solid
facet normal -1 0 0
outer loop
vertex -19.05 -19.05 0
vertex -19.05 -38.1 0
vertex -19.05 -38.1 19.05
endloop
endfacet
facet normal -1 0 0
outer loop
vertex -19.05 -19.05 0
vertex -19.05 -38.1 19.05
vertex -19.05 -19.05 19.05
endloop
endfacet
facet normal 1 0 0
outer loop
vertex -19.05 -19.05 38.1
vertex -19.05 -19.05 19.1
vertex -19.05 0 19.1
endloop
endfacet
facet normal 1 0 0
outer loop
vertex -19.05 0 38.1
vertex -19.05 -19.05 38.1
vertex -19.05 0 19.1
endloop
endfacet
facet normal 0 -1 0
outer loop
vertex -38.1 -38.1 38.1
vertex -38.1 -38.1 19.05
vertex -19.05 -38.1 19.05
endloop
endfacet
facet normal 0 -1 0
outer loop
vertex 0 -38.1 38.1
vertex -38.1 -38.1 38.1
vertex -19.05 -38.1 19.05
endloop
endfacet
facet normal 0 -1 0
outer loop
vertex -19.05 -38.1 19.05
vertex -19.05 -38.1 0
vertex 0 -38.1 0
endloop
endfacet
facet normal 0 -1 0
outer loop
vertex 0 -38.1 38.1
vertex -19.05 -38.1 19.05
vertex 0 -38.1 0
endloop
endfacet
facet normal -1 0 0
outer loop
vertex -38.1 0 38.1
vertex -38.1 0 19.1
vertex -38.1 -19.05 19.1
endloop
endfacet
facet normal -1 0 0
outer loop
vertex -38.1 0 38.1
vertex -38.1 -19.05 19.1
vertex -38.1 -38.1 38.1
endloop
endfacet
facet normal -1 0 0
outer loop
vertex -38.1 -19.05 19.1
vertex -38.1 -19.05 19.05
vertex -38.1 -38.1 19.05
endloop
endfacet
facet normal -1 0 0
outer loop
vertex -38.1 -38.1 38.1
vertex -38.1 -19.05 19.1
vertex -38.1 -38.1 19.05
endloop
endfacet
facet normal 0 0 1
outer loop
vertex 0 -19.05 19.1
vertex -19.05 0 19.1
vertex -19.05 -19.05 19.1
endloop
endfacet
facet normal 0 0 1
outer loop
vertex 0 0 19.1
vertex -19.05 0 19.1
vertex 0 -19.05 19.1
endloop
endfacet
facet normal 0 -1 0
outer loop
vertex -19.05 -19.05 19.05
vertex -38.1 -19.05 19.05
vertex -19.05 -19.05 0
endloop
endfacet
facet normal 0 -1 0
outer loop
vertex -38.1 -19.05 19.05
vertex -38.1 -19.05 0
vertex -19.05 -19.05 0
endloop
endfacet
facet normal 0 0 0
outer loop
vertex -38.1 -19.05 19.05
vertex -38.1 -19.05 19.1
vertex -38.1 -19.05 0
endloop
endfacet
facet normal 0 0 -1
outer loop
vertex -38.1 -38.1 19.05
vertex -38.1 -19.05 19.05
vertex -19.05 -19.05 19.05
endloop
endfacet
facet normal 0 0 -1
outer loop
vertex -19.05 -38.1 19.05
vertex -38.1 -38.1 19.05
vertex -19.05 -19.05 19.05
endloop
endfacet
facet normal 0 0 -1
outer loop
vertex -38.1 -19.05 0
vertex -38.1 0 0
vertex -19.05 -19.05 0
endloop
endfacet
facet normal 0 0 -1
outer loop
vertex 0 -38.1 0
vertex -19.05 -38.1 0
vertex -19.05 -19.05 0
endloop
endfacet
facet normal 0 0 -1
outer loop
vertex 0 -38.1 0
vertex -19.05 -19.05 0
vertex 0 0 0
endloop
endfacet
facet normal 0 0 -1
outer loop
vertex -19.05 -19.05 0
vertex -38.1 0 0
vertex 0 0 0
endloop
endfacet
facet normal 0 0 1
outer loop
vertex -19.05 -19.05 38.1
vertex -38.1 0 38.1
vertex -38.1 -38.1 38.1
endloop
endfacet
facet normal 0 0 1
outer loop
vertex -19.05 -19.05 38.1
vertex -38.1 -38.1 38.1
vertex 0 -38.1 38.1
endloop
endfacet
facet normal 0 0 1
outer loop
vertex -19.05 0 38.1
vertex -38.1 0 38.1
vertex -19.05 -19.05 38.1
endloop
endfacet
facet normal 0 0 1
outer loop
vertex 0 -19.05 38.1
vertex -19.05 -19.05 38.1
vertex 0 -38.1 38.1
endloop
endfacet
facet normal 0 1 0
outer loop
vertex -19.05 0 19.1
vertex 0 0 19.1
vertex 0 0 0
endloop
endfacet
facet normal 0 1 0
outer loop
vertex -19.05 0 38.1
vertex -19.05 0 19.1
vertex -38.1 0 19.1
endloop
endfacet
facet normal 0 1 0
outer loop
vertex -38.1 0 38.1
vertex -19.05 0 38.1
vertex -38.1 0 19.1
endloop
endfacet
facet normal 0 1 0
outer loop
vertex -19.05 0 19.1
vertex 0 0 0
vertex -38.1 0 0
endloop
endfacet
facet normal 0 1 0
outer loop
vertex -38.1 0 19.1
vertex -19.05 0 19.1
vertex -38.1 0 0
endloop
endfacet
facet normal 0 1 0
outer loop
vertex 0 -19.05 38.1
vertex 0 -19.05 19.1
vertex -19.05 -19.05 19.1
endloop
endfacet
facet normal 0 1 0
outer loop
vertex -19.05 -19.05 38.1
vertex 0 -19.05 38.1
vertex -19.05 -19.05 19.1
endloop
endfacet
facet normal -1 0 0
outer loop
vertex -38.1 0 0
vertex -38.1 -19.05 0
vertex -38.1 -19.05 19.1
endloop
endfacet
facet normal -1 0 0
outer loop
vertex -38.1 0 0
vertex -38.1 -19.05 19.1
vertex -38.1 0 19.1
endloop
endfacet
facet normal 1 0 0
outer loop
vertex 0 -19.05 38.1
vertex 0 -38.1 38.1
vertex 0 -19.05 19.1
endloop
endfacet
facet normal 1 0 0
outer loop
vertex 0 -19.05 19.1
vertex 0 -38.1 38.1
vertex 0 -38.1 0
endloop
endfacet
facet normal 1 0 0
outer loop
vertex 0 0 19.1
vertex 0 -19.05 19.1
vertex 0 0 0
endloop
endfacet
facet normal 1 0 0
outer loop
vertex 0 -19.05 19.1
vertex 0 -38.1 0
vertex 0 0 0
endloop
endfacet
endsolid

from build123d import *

# Parameters (mm, degrees)
F0_W     = 19.0500004709
F0_H     = 19.05
F0_W_2   = 19.0500002354
F0_W_3   = 19.05
F1_DEPTH = 19.1
F4_DEPTH = 19.05


with BuildPart() as f1:
    # F0 (on Top) → F1 (new body)
    with BuildSketch(Plane.XY):
        with Locations((-28.5750002354, -9.525)):
            Rectangle(F0_W, F0_H)
        with Locations((-9.5250001177, -9.525)):
            Rectangle(F0_W_2, F0_H)
        with Locations((-9.525, -28.575)):
            Rectangle(F0_W_3, F0_H)
    extrude(amount=F1_DEPTH)

    # F3 (on offset) → F4 (join)
    with BuildSketch(Plane.XY.offset(19.05)):
        Polygon((-19.05, 0), (-38.1, 0), (-38.1, -38.1), (0, -38.1), (0, -19.05), (-19.05, -19.05), align=None)
    extrude(amount=F4_DEPTH)


solid = f1.part
